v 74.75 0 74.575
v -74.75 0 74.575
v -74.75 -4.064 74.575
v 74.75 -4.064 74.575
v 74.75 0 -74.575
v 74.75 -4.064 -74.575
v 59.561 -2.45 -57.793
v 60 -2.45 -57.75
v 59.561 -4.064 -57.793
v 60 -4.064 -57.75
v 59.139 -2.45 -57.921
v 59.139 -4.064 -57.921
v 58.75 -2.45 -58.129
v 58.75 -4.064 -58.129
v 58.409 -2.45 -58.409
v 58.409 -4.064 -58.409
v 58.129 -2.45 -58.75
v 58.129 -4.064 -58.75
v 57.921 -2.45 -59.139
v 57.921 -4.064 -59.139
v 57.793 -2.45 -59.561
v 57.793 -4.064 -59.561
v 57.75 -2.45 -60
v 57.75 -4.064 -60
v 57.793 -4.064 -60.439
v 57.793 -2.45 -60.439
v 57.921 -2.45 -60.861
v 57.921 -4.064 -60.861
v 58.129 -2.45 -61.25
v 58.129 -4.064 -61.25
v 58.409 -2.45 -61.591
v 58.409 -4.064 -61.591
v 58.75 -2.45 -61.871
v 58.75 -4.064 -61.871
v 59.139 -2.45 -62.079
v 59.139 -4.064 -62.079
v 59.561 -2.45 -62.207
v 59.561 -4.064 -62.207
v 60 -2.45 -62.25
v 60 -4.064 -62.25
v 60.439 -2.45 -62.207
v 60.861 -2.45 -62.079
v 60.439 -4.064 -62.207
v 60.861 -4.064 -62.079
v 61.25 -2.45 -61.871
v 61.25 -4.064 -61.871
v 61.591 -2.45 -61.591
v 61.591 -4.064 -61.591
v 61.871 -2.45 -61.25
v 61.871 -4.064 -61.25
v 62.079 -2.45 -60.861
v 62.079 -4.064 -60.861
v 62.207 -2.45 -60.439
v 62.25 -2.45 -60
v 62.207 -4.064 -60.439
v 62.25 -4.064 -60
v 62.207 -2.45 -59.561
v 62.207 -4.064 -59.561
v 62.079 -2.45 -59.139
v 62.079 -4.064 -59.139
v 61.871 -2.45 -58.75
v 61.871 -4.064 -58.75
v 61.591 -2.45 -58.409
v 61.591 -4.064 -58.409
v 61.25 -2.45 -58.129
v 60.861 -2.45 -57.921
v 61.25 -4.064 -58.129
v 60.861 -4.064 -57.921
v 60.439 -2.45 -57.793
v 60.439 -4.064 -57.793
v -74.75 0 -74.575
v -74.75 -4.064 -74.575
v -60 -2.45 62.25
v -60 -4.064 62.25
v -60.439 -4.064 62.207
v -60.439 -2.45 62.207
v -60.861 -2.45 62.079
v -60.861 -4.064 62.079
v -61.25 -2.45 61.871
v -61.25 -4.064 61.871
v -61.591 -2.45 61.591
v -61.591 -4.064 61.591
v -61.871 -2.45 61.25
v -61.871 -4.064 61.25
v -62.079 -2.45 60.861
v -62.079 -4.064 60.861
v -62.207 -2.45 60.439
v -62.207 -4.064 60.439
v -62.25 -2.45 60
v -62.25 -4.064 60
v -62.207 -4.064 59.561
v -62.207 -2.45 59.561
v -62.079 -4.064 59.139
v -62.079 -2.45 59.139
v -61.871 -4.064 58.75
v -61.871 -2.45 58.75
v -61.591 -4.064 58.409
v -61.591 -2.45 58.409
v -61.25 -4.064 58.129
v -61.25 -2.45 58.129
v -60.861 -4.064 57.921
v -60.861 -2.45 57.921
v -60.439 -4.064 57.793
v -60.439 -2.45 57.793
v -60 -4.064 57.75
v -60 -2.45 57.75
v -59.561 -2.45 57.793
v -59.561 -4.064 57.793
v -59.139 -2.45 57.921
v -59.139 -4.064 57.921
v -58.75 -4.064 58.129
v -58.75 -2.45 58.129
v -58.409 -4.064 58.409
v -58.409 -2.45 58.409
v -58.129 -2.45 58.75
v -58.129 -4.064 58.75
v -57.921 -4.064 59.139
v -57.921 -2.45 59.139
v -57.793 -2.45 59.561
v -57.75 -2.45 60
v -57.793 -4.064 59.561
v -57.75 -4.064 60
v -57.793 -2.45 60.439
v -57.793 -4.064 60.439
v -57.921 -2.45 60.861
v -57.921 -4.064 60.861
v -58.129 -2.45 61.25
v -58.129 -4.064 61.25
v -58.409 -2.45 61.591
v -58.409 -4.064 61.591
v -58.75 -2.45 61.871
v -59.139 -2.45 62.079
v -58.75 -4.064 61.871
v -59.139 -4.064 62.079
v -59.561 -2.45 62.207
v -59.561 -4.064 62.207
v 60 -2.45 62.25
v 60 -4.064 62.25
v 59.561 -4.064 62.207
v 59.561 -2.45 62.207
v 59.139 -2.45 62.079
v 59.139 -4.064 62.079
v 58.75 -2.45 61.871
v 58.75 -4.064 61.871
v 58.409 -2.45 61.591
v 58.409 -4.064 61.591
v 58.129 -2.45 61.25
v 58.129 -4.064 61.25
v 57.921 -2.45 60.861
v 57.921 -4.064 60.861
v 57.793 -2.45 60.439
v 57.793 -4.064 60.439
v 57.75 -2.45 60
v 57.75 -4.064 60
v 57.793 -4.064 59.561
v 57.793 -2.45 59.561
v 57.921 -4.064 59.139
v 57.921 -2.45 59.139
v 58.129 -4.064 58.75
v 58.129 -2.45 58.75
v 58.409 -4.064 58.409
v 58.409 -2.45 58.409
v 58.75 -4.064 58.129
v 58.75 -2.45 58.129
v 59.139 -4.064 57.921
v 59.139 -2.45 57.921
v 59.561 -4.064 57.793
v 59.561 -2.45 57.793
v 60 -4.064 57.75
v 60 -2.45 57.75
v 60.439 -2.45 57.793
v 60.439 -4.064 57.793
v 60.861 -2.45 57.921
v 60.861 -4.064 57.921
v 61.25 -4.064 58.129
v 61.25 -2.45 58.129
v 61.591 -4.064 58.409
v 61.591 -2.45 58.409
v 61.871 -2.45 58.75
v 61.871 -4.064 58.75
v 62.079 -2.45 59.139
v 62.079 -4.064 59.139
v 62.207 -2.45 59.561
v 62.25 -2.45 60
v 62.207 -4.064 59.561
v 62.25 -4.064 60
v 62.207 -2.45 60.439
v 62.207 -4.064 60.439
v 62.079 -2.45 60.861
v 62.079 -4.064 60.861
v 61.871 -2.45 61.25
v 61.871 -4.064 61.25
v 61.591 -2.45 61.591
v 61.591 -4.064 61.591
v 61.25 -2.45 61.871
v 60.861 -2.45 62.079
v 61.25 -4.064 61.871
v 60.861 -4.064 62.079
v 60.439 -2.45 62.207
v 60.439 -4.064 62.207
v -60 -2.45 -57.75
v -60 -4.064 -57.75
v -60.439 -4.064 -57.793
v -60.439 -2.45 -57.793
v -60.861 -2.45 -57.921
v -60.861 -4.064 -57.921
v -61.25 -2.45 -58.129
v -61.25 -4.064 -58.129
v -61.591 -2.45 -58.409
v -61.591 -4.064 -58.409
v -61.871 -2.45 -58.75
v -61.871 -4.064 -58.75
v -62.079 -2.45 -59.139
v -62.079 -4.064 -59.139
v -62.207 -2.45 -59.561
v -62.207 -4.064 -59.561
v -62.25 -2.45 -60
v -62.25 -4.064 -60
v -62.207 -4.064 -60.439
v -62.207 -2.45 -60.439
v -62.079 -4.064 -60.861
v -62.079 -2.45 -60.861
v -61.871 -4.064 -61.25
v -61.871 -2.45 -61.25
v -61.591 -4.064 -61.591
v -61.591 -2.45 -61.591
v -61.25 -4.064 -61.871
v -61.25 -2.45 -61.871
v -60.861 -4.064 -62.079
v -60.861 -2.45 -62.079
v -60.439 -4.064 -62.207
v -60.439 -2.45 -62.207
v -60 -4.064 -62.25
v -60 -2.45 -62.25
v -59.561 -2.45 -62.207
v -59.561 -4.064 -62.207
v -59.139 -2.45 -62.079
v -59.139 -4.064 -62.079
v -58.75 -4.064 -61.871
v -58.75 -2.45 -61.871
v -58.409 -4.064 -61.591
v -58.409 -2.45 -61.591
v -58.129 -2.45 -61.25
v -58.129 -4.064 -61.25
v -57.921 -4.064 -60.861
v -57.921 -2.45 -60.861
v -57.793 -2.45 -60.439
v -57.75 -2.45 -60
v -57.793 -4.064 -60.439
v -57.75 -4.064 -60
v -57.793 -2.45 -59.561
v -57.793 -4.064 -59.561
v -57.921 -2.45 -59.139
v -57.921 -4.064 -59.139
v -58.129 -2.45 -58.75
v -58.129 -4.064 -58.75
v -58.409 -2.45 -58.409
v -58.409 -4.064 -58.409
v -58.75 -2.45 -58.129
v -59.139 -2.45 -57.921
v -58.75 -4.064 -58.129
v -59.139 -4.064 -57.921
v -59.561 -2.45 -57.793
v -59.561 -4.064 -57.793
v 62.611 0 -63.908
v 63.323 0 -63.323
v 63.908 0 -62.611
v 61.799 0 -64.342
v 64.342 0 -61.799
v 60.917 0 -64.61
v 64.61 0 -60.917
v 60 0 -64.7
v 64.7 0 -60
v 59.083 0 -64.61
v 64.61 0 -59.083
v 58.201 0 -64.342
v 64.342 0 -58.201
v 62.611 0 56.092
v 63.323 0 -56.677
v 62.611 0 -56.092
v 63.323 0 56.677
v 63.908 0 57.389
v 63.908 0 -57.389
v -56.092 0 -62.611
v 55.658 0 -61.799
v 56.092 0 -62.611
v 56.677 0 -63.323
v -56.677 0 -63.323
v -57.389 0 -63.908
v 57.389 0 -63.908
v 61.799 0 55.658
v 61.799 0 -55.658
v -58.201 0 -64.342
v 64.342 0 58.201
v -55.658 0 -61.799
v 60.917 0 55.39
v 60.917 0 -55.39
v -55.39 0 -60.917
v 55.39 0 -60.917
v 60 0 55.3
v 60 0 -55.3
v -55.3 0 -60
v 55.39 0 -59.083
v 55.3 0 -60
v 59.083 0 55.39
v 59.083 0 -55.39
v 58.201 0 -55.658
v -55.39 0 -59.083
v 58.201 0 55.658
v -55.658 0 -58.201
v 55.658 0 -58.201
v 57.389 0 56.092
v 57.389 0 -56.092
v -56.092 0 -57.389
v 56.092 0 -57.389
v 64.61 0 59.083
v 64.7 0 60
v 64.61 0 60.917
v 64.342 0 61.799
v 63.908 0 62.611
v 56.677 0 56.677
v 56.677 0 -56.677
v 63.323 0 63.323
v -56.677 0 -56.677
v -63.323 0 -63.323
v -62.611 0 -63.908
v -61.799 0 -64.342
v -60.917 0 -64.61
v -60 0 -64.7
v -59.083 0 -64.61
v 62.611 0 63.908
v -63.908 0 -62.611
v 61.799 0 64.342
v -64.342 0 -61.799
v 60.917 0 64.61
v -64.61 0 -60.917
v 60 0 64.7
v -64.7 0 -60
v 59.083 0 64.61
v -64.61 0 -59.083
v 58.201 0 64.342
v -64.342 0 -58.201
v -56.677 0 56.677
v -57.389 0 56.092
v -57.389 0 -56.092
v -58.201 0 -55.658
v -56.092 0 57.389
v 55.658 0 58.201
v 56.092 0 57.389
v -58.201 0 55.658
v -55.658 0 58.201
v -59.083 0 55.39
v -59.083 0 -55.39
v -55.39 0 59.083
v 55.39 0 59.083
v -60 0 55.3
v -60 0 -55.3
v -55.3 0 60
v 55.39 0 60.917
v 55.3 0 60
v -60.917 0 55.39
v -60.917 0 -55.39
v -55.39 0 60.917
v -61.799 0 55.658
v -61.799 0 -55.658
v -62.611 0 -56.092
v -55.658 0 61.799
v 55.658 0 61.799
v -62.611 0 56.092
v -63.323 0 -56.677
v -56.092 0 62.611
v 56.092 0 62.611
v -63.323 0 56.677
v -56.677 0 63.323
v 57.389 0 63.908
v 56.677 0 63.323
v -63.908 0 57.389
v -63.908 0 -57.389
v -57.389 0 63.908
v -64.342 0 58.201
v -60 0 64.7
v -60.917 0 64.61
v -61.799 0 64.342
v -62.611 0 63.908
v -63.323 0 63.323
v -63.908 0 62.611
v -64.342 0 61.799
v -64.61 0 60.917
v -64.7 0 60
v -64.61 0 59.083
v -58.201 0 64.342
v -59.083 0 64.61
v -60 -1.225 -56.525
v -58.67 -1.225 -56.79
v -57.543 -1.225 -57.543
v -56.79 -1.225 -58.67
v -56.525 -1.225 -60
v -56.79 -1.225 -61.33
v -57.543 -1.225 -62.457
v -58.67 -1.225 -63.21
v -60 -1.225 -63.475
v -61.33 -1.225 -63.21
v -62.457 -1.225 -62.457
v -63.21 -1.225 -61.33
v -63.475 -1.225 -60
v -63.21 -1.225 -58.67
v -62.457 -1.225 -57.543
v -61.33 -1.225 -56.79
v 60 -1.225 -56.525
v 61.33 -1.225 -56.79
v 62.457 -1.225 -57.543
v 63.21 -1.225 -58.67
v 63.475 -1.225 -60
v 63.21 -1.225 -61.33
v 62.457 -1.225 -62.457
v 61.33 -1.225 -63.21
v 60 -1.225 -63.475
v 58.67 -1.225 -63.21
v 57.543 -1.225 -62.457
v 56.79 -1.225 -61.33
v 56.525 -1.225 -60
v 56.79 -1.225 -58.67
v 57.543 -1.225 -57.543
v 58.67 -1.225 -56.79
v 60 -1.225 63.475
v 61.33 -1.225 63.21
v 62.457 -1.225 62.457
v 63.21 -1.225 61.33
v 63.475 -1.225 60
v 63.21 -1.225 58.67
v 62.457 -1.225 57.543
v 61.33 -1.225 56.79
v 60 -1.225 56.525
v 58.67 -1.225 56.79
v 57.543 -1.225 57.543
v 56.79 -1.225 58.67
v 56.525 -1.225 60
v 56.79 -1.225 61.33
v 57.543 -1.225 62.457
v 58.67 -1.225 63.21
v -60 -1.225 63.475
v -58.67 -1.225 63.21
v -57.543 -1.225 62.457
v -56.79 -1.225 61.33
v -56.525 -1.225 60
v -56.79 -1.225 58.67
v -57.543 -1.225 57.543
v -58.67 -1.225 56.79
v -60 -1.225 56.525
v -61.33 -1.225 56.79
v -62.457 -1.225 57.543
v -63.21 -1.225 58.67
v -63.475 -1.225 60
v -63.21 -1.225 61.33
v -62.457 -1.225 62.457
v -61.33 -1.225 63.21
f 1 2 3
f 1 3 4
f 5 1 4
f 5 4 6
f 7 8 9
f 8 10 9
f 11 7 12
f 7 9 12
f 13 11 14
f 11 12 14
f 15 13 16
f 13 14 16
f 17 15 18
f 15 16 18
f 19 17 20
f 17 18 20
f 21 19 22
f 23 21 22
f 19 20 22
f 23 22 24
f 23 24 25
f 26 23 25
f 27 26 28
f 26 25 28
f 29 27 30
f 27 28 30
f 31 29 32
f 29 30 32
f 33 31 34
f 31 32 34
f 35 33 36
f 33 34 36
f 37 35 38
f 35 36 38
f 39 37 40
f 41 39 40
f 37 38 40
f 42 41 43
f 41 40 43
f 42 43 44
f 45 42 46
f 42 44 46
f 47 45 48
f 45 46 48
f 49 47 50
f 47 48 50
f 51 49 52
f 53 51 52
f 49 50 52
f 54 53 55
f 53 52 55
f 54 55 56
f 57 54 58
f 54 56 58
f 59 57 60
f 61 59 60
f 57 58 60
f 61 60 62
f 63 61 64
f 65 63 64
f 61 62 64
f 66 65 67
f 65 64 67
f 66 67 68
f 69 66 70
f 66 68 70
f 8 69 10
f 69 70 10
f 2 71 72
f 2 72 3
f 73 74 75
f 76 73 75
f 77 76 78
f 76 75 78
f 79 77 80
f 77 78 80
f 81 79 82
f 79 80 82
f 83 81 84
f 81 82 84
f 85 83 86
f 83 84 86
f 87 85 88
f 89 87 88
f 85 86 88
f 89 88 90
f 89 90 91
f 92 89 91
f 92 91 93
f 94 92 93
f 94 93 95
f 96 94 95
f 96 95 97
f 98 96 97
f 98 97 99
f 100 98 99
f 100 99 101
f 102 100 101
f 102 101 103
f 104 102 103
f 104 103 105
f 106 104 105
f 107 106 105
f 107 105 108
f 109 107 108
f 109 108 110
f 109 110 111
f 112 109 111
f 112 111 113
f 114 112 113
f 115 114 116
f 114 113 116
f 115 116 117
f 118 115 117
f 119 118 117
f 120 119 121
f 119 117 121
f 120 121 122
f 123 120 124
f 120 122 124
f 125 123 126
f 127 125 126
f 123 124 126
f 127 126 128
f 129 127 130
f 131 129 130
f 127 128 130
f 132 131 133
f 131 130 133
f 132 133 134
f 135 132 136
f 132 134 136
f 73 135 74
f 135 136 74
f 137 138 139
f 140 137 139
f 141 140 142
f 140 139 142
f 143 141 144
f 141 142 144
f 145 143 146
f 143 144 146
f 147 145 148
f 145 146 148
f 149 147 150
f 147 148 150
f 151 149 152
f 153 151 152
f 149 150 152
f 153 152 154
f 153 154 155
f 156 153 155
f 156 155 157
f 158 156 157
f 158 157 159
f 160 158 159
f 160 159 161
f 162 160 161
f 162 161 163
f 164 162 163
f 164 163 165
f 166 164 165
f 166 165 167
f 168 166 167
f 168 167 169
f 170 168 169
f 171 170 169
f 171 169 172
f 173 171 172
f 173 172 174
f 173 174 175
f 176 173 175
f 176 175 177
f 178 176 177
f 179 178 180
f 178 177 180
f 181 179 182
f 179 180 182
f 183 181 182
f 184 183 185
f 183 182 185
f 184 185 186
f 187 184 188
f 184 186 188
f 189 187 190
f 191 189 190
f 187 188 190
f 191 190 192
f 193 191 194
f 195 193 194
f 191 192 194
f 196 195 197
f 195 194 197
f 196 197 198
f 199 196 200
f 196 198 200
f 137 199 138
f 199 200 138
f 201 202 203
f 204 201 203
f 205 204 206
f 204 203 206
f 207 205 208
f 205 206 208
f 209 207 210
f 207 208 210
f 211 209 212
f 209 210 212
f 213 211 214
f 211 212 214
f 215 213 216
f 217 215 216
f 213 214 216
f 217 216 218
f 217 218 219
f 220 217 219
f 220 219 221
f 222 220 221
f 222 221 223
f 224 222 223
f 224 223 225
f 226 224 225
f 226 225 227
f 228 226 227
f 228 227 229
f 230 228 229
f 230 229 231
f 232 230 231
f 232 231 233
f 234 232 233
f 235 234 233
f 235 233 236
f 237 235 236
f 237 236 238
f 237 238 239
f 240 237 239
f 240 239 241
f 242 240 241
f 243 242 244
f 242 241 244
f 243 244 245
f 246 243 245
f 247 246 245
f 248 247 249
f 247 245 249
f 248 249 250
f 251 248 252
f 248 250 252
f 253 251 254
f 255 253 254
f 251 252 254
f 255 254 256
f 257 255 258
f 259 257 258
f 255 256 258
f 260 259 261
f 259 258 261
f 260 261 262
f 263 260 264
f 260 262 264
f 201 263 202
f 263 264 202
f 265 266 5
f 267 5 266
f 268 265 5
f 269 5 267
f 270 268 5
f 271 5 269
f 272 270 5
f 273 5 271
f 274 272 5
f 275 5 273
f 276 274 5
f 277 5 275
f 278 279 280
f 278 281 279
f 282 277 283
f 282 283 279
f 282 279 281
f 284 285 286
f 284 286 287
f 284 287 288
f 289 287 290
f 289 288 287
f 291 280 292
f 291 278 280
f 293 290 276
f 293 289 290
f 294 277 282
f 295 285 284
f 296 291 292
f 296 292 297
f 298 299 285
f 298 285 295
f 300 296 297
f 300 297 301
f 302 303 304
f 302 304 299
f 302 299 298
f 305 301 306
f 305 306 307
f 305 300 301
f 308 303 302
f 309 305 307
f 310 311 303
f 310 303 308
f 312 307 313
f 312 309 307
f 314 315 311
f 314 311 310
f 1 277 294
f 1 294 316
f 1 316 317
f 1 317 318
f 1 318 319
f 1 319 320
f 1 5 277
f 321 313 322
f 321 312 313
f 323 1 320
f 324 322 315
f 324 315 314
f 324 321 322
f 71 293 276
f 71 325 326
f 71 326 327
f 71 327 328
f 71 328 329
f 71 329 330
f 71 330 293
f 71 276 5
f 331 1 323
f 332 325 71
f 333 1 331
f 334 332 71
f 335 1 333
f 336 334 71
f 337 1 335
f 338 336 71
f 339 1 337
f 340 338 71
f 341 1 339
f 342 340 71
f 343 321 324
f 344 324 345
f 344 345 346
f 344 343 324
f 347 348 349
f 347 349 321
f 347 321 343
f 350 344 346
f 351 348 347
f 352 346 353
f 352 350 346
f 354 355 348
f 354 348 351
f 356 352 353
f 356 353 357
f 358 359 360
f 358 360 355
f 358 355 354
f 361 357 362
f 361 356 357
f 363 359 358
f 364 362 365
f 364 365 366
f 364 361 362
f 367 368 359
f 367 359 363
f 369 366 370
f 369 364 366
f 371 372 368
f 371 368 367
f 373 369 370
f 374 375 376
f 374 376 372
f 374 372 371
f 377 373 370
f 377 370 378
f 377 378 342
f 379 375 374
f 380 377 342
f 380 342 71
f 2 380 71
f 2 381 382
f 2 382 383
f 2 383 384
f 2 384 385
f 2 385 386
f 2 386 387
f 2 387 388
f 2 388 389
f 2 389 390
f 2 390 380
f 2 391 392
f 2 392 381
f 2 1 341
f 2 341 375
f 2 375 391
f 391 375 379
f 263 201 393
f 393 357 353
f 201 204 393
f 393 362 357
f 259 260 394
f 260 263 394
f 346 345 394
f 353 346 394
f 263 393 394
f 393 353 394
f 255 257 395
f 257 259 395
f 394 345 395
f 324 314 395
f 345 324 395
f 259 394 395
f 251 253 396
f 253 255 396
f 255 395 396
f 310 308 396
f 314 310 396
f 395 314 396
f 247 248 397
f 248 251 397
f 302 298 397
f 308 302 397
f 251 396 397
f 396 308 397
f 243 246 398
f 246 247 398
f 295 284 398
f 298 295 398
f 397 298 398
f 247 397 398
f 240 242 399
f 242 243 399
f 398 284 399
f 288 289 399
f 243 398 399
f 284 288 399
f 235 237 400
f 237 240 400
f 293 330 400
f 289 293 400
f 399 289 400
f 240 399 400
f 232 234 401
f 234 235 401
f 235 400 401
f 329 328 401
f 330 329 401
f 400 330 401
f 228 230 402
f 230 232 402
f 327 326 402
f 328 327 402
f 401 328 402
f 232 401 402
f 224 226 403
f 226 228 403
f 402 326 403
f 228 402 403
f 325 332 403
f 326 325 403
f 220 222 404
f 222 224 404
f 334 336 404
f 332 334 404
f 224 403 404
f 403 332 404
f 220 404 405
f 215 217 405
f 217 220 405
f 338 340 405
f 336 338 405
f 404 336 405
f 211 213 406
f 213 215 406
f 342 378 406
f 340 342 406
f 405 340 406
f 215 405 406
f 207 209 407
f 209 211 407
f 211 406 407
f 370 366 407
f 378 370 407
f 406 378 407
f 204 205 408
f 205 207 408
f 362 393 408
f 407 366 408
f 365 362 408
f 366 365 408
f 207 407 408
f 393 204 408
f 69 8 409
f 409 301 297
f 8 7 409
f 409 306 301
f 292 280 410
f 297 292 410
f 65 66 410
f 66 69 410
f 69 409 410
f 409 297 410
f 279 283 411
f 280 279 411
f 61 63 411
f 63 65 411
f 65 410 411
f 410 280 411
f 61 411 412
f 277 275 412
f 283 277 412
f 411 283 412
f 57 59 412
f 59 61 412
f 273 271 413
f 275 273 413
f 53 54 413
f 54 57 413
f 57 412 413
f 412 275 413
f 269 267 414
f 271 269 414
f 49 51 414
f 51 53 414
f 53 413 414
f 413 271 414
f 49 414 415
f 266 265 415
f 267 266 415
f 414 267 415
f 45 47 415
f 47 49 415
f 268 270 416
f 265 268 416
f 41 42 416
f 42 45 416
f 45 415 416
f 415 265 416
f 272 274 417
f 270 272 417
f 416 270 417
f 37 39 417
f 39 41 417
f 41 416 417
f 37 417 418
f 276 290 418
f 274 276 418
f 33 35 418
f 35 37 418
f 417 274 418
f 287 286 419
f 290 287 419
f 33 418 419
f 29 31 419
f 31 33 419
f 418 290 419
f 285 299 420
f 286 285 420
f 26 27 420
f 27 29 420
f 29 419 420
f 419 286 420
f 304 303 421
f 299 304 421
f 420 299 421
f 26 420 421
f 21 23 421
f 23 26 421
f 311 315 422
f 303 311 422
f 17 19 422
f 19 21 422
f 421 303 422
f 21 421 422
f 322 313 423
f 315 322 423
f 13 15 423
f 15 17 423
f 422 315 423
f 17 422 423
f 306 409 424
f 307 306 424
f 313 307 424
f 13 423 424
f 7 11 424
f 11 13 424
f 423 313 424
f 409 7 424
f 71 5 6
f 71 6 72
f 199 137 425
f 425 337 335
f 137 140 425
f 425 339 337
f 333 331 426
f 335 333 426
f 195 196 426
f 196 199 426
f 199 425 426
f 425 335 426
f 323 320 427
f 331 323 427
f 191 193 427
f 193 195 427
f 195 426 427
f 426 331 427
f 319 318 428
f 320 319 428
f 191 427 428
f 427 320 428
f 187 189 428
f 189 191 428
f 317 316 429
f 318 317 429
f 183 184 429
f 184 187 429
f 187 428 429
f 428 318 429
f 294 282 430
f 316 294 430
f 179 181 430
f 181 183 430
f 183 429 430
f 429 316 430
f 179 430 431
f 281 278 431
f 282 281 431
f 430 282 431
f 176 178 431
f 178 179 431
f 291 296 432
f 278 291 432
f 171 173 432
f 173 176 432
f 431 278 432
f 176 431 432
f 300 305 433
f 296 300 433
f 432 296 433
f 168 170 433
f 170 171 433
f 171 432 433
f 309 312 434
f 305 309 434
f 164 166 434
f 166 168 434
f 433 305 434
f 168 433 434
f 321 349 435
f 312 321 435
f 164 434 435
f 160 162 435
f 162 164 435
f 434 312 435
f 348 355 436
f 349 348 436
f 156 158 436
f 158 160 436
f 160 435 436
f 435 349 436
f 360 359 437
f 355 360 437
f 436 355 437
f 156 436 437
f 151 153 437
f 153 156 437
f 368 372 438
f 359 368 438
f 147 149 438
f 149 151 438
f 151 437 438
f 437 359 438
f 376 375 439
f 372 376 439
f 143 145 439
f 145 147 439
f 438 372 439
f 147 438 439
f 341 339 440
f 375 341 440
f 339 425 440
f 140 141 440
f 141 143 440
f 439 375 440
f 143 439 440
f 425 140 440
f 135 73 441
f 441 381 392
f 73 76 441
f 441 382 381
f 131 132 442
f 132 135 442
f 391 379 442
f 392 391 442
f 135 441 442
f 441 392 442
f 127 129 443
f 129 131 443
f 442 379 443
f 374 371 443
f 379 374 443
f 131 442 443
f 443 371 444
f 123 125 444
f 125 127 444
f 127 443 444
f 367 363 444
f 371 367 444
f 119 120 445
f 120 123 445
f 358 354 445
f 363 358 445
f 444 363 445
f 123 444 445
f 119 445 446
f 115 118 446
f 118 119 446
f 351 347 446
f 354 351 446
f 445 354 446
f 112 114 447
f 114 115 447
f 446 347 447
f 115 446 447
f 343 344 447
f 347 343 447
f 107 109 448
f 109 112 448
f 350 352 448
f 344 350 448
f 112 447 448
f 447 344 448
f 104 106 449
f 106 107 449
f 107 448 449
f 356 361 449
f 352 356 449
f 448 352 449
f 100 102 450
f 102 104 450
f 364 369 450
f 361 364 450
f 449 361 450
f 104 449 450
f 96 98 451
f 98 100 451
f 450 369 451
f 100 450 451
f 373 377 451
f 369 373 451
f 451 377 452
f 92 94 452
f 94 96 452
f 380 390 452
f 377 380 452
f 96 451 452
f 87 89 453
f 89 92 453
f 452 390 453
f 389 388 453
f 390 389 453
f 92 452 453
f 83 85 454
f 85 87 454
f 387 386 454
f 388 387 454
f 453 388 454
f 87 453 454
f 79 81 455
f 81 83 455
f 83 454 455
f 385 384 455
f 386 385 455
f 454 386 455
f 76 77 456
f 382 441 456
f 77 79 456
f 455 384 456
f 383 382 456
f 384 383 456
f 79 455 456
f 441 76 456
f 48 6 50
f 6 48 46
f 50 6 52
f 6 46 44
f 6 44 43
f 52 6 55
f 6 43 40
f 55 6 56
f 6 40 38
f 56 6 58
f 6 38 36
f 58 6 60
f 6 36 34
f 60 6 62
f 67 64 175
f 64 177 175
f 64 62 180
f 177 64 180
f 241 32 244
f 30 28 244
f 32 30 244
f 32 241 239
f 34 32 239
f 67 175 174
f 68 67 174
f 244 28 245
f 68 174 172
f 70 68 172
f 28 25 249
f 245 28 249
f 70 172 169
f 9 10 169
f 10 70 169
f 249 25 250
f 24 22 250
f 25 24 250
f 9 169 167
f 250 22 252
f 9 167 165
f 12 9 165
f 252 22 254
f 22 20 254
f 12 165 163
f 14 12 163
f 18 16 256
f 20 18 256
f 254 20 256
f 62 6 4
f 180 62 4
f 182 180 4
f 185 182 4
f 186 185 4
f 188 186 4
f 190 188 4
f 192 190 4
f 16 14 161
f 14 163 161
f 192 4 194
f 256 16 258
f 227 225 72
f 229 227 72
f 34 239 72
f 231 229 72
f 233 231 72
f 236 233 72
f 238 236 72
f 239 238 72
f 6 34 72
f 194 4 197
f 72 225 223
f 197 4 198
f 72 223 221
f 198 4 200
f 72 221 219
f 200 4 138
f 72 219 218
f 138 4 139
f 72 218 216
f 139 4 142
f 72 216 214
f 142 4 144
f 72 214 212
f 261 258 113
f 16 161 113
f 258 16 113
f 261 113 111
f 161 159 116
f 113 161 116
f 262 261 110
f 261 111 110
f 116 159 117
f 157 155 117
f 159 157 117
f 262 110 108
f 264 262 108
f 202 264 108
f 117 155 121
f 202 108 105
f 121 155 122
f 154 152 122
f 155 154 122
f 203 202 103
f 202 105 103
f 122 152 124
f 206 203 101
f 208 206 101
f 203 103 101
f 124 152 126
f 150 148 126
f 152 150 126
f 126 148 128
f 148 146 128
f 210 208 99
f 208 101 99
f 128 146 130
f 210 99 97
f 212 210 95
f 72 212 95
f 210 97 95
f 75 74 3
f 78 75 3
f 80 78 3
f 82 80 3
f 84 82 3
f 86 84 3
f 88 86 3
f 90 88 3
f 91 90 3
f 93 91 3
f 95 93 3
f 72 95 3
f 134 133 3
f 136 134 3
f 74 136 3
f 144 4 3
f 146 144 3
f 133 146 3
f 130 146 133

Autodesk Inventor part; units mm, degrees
ref_plane "YZ Plane" through (0, 0, 0) normal (1, 0, 0) x (0, 1, 0)
ref_plane "XZ Plane" through (0, 0, 0) normal (0, 1, 0) x (-1, 0, 0)
ref_plane "XY Plane" through (0, 0, 0) normal (0, 0, 1) x (1, 0, 0)
sketch "Sketch1" plane through (0, 0, 0) normal (0, 1, 0) x (-1, 0, 0)
  line L0 (74.75, 74.575) -> (-74.75, 74.575)
  line L1 (-74.75, 74.575) -> (-74.75, -74.575)
  line L2 (-74.75, -74.575) -> (74.75, -74.575)
  line L3 (74.75, -74.575) -> (74.75, 74.575)
  line L4 (74.75, 74.575) -> (-74.75, -74.575) construction
  line L5 (-74.75, 74.575) -> (74.75, -74.575) construction
  point P0 (0, 0)
  dimension "d32" = 149.5
  dimension "d33" = 149.15
extrude "Extrusion1" add sketch "Sketch1" against normal blind 4.064
hole "Hole4" at (60, 0, -60) direction (0, -1, 0) diameter 4.5 depth 4.064 countersink diameter 9.4 countersink angle 90
hole "Hole3" at (-60, 0, 60) direction (0, -1, 0) diameter 4.5 depth 4.064 countersink diameter 9.4 countersink angle 90
sketch "Sketch3" plane through (0, 0, 0) normal (0, 1, 0) x (-1, 0, 0)
  point P0 (60, 60)
hole "Hole2" at (60, 0, 60) direction (0, -1, 0) diameter 4.5 depth 4.064 countersink diameter 9.4 countersink angle 90
sketch "Sketch2" plane through (0, 0, 0) normal (0, 1, 0) x (-1, 0, 0)
  point P0 (-60, -60)
hole "Hole1" at (-60, 0, -60) direction (0, -1, 0) diameter 4.5 depth 4.064 countersink diameter 9.4 countersink angle 90
sketch "Sketch4" plane through (0, 0, 0) normal (0, 1, 0) x (-1, 0, 0)
  point P0 (-60, 60)
sketch "Sketch5" plane through (0, 0, 0) normal (0, 1, 0) x (-1, 0, 0)
  point P0 (60, -60)
properties part number "Piston Build surface" material "Aluminum 6061"
